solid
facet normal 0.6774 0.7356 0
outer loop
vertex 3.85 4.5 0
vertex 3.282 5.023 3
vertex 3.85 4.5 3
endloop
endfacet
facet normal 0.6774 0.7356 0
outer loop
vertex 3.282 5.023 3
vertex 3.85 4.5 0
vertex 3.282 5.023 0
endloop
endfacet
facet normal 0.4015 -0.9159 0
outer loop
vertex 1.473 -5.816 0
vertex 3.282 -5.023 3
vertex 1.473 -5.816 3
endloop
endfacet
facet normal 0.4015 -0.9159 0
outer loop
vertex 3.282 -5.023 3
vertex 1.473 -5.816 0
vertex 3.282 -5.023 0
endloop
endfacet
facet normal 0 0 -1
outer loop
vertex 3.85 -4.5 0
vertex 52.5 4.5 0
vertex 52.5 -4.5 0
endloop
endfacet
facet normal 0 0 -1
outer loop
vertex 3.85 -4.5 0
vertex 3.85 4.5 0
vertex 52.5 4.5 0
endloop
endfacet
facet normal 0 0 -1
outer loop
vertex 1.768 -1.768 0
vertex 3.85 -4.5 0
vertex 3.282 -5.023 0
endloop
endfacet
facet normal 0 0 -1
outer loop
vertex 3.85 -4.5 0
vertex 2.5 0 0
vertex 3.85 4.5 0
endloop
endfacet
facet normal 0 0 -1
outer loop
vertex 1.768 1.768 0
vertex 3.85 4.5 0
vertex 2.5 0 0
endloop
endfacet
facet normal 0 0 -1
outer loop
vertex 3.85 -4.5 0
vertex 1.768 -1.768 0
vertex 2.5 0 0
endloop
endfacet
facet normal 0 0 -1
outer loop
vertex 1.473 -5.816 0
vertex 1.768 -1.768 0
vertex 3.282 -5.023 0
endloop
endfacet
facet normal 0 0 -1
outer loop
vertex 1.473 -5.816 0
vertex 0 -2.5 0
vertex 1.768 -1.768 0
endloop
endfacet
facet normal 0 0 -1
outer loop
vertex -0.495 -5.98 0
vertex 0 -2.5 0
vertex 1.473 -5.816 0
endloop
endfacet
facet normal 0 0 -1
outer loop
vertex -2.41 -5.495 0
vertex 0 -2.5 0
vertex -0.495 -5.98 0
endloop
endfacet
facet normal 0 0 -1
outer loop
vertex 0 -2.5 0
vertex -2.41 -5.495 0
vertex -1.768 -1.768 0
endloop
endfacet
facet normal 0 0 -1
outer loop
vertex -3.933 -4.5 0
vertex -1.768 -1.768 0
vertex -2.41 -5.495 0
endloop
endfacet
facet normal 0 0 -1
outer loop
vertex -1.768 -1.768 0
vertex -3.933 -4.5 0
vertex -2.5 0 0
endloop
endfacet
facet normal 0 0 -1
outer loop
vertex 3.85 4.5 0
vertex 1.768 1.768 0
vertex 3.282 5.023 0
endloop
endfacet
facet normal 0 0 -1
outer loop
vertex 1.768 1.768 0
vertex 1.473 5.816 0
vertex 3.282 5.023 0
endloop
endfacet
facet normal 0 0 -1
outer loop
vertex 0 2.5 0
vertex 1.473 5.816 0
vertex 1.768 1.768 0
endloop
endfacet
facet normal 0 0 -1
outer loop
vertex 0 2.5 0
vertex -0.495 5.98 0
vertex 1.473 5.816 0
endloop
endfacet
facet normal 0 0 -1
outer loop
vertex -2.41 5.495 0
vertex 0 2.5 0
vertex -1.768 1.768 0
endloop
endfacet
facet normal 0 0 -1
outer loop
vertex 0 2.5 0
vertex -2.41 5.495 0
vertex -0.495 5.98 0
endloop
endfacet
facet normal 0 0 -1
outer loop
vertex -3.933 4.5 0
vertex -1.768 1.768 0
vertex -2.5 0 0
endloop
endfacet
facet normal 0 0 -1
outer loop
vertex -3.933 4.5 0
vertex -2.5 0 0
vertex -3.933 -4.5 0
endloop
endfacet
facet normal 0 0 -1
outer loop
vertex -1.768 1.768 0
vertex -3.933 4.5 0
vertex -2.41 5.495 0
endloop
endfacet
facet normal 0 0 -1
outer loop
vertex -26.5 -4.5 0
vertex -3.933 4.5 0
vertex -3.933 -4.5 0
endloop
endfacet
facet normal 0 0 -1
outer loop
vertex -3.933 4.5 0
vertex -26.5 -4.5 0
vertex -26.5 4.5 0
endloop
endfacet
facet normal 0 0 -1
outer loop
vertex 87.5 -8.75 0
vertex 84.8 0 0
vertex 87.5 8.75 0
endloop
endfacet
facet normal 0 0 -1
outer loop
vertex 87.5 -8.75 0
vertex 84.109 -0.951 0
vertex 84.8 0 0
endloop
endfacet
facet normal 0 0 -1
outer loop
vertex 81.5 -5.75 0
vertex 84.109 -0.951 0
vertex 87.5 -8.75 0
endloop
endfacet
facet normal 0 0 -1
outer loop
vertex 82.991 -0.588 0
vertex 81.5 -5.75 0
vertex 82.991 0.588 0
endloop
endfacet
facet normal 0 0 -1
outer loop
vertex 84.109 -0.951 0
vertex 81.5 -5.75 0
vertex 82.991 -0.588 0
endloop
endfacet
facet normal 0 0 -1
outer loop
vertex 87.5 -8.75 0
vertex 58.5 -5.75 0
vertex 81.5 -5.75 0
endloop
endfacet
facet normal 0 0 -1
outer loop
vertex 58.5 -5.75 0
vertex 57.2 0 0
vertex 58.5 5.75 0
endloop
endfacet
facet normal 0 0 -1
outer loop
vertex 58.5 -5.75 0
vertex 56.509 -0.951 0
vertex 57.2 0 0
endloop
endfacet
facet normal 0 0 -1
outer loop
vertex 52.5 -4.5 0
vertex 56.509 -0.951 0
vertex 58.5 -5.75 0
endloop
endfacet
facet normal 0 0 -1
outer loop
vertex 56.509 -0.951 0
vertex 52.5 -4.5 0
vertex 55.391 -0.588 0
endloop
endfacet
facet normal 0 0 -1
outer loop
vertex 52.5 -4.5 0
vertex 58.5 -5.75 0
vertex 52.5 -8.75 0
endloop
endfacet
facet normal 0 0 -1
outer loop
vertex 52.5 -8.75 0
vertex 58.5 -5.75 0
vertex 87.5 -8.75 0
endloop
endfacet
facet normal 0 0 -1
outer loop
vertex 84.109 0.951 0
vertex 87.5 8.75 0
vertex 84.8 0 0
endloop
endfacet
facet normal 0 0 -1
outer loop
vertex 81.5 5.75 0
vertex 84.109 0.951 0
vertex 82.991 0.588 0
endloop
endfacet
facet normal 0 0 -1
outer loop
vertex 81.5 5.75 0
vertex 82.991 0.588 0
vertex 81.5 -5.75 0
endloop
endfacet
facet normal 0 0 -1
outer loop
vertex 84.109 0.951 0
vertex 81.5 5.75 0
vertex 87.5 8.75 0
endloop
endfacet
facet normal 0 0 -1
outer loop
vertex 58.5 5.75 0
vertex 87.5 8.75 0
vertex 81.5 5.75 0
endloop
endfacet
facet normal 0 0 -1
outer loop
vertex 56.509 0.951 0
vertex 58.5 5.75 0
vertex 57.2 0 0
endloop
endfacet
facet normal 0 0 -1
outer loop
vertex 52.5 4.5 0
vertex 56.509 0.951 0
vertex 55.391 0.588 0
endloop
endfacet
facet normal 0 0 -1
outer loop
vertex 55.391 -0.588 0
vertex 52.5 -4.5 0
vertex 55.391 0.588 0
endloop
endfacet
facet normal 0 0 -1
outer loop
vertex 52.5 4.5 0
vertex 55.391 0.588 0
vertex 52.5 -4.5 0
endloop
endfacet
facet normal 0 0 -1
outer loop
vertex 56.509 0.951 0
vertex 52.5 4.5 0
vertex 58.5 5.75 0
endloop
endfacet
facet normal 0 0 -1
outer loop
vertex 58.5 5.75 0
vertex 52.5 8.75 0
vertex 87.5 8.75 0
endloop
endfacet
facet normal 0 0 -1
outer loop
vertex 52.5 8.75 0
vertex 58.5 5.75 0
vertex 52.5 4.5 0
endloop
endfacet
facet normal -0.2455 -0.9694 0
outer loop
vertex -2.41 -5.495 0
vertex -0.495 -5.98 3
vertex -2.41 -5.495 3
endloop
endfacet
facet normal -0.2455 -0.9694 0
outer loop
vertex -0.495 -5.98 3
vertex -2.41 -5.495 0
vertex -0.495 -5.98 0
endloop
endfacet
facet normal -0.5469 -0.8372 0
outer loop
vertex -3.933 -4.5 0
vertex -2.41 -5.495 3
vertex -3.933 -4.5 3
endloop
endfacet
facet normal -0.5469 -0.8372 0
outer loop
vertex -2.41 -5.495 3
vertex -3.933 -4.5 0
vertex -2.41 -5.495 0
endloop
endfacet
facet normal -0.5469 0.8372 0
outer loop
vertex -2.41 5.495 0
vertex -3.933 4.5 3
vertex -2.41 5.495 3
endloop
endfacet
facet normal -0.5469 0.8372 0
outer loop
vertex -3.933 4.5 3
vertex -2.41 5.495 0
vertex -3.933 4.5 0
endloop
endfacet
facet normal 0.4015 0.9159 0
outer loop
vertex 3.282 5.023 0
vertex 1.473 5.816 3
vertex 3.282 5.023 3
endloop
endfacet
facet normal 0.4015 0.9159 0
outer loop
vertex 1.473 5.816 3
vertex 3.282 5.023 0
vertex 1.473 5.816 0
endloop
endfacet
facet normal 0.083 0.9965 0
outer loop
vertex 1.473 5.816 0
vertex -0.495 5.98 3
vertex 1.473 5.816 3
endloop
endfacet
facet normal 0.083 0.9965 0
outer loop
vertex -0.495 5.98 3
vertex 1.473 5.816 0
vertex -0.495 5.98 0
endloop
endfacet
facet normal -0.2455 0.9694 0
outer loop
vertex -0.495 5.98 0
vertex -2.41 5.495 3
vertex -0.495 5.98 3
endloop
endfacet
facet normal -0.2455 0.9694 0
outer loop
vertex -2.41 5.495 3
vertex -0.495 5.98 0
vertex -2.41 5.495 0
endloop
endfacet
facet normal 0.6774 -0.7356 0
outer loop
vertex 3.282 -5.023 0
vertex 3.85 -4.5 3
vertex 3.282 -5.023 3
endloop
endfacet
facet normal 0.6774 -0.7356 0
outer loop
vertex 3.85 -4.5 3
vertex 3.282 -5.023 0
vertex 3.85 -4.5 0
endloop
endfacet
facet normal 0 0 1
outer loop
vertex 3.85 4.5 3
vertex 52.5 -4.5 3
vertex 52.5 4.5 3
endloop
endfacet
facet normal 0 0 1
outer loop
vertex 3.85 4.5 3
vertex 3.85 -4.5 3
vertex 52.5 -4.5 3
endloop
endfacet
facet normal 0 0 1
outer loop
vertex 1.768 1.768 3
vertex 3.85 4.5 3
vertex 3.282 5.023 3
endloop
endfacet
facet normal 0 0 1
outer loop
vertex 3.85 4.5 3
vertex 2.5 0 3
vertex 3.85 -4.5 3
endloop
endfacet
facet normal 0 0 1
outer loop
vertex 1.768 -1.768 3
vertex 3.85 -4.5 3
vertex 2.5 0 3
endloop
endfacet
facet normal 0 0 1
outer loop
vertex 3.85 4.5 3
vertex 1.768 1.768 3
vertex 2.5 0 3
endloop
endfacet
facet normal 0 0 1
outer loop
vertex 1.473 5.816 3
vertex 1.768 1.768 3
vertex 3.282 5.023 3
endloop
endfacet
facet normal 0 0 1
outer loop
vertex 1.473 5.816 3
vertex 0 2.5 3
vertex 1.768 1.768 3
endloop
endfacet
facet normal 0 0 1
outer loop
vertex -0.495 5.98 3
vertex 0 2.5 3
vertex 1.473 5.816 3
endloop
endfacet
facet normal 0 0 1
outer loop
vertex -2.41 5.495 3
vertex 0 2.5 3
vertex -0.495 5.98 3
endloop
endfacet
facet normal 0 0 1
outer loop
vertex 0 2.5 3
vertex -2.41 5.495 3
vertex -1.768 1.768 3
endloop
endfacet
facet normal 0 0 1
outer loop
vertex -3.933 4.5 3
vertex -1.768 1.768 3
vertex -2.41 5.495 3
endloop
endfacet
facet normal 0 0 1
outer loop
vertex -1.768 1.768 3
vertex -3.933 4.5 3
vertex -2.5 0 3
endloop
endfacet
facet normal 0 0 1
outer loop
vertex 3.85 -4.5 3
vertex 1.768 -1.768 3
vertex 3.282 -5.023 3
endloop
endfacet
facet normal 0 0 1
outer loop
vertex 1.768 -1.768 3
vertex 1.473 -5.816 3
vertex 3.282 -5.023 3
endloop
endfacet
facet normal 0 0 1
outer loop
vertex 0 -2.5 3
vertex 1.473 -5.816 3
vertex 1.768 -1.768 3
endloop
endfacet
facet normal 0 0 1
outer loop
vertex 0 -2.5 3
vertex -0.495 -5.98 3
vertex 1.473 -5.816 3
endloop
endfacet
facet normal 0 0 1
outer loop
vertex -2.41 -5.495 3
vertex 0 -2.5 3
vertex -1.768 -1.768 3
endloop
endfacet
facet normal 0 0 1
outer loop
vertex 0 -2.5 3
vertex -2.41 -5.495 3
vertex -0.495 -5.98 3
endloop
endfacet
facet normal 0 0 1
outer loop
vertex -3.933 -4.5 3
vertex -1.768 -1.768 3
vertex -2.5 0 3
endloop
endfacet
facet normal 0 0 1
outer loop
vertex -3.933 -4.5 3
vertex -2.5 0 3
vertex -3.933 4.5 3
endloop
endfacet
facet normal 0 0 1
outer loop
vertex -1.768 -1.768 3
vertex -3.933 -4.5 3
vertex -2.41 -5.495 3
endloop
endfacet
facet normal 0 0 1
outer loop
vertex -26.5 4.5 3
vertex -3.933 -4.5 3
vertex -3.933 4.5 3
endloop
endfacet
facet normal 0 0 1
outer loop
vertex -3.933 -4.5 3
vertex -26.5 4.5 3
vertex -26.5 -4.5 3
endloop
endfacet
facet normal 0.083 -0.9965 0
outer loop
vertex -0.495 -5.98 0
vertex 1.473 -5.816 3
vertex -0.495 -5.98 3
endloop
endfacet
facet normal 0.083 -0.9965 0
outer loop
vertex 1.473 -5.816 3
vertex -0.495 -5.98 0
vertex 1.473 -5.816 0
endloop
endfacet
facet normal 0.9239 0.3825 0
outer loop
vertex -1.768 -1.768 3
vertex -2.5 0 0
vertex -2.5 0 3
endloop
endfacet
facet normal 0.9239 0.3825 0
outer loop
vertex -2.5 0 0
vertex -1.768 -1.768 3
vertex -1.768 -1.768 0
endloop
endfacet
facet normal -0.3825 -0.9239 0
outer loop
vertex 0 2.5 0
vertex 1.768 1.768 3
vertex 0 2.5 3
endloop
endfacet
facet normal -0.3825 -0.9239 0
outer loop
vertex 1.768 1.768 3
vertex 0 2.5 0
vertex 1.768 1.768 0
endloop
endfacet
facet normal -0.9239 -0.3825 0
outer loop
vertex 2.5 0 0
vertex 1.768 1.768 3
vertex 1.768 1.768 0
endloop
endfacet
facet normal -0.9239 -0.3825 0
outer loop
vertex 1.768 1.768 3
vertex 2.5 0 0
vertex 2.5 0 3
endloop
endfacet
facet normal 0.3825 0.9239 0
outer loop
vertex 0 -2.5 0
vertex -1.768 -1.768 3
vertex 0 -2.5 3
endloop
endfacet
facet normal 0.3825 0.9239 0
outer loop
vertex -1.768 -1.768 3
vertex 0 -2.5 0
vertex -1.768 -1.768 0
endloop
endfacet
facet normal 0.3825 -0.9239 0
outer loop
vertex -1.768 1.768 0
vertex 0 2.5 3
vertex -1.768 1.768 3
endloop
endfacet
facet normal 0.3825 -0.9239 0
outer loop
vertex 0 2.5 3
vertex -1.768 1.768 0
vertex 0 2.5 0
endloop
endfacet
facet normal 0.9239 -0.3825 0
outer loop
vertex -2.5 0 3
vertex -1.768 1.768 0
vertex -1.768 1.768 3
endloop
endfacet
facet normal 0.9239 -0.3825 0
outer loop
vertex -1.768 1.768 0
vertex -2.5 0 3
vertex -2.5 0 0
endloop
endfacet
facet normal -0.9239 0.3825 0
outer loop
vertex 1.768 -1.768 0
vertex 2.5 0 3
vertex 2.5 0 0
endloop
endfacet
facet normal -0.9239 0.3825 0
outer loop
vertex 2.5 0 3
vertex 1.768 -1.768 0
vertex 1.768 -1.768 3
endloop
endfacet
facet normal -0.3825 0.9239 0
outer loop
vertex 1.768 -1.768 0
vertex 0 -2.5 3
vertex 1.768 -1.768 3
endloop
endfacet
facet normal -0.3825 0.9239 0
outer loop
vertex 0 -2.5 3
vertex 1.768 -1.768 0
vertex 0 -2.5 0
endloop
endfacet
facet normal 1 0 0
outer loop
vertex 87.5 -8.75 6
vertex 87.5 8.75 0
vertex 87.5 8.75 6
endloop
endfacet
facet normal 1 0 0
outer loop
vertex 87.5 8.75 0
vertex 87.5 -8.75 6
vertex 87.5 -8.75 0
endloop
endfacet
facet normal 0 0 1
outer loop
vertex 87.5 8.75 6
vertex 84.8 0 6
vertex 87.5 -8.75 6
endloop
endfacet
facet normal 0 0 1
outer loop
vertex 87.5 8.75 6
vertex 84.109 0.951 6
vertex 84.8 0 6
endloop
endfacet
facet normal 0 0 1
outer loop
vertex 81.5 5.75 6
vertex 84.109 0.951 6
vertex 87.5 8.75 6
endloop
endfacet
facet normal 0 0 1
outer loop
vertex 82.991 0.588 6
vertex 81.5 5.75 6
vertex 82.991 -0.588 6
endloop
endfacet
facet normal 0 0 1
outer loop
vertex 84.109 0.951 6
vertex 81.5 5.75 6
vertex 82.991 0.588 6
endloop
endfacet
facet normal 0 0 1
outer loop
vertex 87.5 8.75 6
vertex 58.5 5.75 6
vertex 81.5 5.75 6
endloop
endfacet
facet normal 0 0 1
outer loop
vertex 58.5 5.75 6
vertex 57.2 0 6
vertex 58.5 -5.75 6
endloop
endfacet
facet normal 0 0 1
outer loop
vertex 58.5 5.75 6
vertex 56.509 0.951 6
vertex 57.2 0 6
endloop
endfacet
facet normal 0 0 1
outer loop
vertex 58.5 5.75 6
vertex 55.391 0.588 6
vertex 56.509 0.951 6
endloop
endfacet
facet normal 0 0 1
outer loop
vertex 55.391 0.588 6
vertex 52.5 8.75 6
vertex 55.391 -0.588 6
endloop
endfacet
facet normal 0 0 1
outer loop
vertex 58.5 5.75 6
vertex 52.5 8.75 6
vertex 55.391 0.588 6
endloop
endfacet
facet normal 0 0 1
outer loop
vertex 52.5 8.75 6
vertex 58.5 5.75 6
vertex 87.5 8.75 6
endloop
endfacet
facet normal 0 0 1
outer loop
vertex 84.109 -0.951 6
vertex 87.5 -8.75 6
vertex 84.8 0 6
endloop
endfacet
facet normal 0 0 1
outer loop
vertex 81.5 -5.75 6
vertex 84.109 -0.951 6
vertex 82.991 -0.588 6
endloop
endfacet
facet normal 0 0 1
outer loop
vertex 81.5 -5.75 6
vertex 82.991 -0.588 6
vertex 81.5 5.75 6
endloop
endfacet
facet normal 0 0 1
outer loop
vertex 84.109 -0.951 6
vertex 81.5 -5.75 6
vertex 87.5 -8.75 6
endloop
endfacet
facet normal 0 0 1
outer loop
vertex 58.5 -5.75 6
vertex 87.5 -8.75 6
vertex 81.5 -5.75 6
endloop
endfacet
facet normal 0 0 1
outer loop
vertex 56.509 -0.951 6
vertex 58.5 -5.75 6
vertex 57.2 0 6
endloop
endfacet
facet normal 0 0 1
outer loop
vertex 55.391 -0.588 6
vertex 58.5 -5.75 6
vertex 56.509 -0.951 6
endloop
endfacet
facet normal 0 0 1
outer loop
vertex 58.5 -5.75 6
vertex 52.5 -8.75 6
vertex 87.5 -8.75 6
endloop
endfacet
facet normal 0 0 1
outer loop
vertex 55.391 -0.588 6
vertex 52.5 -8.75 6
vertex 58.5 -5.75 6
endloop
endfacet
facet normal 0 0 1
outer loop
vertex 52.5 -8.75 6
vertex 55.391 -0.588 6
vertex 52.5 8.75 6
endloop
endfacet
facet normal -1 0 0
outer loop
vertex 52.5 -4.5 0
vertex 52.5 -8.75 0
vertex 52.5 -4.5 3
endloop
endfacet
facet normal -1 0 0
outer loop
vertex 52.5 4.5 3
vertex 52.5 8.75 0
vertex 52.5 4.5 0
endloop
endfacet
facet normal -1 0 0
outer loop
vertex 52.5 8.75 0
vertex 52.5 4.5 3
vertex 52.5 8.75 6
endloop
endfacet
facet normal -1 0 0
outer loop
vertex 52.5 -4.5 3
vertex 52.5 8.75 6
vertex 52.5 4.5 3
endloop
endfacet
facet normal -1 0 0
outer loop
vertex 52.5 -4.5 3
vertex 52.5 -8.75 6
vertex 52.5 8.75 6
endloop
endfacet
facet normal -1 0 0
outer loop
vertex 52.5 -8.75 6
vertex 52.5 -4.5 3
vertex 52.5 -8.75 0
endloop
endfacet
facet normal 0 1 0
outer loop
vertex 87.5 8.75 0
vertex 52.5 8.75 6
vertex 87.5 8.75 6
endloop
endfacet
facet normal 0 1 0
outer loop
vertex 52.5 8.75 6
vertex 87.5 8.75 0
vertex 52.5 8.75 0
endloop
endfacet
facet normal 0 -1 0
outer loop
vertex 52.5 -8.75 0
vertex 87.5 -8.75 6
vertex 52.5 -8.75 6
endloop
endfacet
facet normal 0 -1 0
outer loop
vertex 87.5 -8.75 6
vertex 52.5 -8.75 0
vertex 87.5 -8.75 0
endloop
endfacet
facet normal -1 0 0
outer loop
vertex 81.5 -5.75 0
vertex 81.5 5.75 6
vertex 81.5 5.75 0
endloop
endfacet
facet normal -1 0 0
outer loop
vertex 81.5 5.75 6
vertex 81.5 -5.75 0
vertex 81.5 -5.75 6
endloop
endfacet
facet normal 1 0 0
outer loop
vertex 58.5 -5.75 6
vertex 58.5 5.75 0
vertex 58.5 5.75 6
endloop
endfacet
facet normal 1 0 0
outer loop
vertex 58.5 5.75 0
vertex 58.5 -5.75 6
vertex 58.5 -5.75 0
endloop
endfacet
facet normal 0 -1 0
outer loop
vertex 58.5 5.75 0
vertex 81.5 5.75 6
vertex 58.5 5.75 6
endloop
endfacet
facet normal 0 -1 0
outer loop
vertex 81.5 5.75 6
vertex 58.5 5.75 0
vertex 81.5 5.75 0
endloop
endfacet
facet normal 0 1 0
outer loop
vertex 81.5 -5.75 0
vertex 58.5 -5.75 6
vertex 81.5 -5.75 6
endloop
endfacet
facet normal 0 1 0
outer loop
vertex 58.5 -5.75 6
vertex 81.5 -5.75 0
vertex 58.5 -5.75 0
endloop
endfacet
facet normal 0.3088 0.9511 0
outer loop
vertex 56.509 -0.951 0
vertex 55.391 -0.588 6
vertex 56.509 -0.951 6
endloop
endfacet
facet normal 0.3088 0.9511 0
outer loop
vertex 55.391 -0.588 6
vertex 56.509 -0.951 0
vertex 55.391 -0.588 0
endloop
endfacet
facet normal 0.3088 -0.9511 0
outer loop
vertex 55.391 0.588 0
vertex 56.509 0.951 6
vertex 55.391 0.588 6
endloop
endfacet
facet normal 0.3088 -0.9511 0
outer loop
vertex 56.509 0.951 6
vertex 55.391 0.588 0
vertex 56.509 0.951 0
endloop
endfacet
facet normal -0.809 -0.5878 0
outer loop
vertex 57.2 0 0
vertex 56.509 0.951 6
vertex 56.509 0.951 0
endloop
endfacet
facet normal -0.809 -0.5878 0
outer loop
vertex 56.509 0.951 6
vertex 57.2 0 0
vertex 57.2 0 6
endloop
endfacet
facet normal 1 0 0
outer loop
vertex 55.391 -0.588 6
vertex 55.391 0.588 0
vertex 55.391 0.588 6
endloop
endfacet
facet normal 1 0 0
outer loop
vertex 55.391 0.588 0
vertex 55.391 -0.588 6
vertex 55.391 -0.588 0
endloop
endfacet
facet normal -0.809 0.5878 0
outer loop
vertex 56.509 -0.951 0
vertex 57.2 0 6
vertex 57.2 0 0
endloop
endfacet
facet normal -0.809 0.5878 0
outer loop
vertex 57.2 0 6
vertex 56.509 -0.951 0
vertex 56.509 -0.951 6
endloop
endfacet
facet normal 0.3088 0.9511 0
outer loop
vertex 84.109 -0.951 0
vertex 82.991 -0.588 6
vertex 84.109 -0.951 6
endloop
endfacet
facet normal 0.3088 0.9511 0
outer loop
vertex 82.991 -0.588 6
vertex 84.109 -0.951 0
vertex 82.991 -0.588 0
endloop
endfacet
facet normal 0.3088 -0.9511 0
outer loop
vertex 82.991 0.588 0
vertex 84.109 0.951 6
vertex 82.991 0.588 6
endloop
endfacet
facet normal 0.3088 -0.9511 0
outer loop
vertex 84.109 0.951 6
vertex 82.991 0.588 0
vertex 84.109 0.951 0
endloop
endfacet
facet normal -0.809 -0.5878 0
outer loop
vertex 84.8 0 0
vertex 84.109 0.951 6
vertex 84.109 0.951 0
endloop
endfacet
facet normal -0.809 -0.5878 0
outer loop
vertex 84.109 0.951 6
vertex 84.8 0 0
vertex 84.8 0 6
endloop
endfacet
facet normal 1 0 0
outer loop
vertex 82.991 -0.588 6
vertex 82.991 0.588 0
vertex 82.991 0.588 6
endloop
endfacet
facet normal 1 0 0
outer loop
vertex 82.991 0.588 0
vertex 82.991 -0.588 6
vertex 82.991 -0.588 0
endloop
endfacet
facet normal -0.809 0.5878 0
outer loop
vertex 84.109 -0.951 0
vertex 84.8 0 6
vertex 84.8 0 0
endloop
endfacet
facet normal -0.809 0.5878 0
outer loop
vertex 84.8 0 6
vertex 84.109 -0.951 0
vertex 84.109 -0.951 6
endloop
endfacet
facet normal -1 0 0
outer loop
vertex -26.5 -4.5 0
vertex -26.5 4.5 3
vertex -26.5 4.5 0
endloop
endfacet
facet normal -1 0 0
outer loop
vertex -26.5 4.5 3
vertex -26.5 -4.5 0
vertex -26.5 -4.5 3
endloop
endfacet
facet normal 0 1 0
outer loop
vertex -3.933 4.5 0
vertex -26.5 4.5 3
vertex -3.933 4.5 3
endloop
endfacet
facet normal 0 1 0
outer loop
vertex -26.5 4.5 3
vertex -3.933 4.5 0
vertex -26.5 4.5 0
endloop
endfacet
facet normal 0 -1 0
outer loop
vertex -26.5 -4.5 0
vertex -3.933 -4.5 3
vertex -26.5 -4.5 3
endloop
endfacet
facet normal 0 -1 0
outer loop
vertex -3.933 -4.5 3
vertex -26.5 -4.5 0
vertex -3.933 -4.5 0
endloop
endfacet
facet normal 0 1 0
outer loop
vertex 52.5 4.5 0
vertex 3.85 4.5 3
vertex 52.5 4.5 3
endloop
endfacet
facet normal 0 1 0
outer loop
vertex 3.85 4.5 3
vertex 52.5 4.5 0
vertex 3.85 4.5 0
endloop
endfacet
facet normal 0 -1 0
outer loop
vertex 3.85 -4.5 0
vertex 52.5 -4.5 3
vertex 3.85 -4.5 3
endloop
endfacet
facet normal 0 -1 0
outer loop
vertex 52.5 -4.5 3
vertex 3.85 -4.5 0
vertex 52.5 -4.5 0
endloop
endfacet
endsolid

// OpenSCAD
servoMountOuterRadius = 6.0;
servoMountInnerRadius = 2.5;
servoInnerLength = 23.0;
servoInnerWidth = 11.5;
servoOuterLength = servoInnerLength + 12;
servoOuterWidth = servoInnerWidth + 6;
servoMountHeight = 6;
servoShaftPosition = servoInnerLength - 6;

armLengthCenterToCenter = 81.5;
armHeight = 3.0;
armWidth = 9.0;

stylusHolderOuterRadius = 7.5;
stylusHolderInnerRadius = 3.0;

servoCounterWeightLength = 24.0;

module servoShaftMount() {
	difference() {
		cylinder(r=servoMountOuterRadius, h=armHeight);
   translate([0,0,-1]) // start 1 mm below the surface
		cylinder(r=servoMountInnerRadius, h=armHeight+2);
	}
}

module servoCounterWeight() {
	cube([servoCounterWeightLength, armWidth, armHeight]);
}

module servoMount() {
	difference() {
  	cube([servoOuterLength, servoOuterWidth, servoMountHeight]);
		translate([6, 3, 0]) {
			cube([servoInnerLength, servoInnerWidth, servoMountHeight]);
		}
		translate([3.7, 8.75, 0]) {
			cylinder(r=1, h=6);
		}
		translate([31.3, 8.75, 0]) {
			cylinder(r=1, h=6);
		}
	}
}

module arm() {
	cube([armLengthCenterToCenter - servoShaftPosition - 12, armWidth, armHeight]);
}

union() {
	servoShaftMount();
	translate([-servoMountInnerRadius - servoCounterWeightLength, -armWidth / 2.0, 0]) servoCounterWeight();
	translate([servoMountInnerRadius, -armWidth / 2.0, 0])	arm();
	translate([armLengthCenterToCenter - servoShaftPosition - 12, -servoOuterWidth / 2.0, 0]) servoMount();
}
